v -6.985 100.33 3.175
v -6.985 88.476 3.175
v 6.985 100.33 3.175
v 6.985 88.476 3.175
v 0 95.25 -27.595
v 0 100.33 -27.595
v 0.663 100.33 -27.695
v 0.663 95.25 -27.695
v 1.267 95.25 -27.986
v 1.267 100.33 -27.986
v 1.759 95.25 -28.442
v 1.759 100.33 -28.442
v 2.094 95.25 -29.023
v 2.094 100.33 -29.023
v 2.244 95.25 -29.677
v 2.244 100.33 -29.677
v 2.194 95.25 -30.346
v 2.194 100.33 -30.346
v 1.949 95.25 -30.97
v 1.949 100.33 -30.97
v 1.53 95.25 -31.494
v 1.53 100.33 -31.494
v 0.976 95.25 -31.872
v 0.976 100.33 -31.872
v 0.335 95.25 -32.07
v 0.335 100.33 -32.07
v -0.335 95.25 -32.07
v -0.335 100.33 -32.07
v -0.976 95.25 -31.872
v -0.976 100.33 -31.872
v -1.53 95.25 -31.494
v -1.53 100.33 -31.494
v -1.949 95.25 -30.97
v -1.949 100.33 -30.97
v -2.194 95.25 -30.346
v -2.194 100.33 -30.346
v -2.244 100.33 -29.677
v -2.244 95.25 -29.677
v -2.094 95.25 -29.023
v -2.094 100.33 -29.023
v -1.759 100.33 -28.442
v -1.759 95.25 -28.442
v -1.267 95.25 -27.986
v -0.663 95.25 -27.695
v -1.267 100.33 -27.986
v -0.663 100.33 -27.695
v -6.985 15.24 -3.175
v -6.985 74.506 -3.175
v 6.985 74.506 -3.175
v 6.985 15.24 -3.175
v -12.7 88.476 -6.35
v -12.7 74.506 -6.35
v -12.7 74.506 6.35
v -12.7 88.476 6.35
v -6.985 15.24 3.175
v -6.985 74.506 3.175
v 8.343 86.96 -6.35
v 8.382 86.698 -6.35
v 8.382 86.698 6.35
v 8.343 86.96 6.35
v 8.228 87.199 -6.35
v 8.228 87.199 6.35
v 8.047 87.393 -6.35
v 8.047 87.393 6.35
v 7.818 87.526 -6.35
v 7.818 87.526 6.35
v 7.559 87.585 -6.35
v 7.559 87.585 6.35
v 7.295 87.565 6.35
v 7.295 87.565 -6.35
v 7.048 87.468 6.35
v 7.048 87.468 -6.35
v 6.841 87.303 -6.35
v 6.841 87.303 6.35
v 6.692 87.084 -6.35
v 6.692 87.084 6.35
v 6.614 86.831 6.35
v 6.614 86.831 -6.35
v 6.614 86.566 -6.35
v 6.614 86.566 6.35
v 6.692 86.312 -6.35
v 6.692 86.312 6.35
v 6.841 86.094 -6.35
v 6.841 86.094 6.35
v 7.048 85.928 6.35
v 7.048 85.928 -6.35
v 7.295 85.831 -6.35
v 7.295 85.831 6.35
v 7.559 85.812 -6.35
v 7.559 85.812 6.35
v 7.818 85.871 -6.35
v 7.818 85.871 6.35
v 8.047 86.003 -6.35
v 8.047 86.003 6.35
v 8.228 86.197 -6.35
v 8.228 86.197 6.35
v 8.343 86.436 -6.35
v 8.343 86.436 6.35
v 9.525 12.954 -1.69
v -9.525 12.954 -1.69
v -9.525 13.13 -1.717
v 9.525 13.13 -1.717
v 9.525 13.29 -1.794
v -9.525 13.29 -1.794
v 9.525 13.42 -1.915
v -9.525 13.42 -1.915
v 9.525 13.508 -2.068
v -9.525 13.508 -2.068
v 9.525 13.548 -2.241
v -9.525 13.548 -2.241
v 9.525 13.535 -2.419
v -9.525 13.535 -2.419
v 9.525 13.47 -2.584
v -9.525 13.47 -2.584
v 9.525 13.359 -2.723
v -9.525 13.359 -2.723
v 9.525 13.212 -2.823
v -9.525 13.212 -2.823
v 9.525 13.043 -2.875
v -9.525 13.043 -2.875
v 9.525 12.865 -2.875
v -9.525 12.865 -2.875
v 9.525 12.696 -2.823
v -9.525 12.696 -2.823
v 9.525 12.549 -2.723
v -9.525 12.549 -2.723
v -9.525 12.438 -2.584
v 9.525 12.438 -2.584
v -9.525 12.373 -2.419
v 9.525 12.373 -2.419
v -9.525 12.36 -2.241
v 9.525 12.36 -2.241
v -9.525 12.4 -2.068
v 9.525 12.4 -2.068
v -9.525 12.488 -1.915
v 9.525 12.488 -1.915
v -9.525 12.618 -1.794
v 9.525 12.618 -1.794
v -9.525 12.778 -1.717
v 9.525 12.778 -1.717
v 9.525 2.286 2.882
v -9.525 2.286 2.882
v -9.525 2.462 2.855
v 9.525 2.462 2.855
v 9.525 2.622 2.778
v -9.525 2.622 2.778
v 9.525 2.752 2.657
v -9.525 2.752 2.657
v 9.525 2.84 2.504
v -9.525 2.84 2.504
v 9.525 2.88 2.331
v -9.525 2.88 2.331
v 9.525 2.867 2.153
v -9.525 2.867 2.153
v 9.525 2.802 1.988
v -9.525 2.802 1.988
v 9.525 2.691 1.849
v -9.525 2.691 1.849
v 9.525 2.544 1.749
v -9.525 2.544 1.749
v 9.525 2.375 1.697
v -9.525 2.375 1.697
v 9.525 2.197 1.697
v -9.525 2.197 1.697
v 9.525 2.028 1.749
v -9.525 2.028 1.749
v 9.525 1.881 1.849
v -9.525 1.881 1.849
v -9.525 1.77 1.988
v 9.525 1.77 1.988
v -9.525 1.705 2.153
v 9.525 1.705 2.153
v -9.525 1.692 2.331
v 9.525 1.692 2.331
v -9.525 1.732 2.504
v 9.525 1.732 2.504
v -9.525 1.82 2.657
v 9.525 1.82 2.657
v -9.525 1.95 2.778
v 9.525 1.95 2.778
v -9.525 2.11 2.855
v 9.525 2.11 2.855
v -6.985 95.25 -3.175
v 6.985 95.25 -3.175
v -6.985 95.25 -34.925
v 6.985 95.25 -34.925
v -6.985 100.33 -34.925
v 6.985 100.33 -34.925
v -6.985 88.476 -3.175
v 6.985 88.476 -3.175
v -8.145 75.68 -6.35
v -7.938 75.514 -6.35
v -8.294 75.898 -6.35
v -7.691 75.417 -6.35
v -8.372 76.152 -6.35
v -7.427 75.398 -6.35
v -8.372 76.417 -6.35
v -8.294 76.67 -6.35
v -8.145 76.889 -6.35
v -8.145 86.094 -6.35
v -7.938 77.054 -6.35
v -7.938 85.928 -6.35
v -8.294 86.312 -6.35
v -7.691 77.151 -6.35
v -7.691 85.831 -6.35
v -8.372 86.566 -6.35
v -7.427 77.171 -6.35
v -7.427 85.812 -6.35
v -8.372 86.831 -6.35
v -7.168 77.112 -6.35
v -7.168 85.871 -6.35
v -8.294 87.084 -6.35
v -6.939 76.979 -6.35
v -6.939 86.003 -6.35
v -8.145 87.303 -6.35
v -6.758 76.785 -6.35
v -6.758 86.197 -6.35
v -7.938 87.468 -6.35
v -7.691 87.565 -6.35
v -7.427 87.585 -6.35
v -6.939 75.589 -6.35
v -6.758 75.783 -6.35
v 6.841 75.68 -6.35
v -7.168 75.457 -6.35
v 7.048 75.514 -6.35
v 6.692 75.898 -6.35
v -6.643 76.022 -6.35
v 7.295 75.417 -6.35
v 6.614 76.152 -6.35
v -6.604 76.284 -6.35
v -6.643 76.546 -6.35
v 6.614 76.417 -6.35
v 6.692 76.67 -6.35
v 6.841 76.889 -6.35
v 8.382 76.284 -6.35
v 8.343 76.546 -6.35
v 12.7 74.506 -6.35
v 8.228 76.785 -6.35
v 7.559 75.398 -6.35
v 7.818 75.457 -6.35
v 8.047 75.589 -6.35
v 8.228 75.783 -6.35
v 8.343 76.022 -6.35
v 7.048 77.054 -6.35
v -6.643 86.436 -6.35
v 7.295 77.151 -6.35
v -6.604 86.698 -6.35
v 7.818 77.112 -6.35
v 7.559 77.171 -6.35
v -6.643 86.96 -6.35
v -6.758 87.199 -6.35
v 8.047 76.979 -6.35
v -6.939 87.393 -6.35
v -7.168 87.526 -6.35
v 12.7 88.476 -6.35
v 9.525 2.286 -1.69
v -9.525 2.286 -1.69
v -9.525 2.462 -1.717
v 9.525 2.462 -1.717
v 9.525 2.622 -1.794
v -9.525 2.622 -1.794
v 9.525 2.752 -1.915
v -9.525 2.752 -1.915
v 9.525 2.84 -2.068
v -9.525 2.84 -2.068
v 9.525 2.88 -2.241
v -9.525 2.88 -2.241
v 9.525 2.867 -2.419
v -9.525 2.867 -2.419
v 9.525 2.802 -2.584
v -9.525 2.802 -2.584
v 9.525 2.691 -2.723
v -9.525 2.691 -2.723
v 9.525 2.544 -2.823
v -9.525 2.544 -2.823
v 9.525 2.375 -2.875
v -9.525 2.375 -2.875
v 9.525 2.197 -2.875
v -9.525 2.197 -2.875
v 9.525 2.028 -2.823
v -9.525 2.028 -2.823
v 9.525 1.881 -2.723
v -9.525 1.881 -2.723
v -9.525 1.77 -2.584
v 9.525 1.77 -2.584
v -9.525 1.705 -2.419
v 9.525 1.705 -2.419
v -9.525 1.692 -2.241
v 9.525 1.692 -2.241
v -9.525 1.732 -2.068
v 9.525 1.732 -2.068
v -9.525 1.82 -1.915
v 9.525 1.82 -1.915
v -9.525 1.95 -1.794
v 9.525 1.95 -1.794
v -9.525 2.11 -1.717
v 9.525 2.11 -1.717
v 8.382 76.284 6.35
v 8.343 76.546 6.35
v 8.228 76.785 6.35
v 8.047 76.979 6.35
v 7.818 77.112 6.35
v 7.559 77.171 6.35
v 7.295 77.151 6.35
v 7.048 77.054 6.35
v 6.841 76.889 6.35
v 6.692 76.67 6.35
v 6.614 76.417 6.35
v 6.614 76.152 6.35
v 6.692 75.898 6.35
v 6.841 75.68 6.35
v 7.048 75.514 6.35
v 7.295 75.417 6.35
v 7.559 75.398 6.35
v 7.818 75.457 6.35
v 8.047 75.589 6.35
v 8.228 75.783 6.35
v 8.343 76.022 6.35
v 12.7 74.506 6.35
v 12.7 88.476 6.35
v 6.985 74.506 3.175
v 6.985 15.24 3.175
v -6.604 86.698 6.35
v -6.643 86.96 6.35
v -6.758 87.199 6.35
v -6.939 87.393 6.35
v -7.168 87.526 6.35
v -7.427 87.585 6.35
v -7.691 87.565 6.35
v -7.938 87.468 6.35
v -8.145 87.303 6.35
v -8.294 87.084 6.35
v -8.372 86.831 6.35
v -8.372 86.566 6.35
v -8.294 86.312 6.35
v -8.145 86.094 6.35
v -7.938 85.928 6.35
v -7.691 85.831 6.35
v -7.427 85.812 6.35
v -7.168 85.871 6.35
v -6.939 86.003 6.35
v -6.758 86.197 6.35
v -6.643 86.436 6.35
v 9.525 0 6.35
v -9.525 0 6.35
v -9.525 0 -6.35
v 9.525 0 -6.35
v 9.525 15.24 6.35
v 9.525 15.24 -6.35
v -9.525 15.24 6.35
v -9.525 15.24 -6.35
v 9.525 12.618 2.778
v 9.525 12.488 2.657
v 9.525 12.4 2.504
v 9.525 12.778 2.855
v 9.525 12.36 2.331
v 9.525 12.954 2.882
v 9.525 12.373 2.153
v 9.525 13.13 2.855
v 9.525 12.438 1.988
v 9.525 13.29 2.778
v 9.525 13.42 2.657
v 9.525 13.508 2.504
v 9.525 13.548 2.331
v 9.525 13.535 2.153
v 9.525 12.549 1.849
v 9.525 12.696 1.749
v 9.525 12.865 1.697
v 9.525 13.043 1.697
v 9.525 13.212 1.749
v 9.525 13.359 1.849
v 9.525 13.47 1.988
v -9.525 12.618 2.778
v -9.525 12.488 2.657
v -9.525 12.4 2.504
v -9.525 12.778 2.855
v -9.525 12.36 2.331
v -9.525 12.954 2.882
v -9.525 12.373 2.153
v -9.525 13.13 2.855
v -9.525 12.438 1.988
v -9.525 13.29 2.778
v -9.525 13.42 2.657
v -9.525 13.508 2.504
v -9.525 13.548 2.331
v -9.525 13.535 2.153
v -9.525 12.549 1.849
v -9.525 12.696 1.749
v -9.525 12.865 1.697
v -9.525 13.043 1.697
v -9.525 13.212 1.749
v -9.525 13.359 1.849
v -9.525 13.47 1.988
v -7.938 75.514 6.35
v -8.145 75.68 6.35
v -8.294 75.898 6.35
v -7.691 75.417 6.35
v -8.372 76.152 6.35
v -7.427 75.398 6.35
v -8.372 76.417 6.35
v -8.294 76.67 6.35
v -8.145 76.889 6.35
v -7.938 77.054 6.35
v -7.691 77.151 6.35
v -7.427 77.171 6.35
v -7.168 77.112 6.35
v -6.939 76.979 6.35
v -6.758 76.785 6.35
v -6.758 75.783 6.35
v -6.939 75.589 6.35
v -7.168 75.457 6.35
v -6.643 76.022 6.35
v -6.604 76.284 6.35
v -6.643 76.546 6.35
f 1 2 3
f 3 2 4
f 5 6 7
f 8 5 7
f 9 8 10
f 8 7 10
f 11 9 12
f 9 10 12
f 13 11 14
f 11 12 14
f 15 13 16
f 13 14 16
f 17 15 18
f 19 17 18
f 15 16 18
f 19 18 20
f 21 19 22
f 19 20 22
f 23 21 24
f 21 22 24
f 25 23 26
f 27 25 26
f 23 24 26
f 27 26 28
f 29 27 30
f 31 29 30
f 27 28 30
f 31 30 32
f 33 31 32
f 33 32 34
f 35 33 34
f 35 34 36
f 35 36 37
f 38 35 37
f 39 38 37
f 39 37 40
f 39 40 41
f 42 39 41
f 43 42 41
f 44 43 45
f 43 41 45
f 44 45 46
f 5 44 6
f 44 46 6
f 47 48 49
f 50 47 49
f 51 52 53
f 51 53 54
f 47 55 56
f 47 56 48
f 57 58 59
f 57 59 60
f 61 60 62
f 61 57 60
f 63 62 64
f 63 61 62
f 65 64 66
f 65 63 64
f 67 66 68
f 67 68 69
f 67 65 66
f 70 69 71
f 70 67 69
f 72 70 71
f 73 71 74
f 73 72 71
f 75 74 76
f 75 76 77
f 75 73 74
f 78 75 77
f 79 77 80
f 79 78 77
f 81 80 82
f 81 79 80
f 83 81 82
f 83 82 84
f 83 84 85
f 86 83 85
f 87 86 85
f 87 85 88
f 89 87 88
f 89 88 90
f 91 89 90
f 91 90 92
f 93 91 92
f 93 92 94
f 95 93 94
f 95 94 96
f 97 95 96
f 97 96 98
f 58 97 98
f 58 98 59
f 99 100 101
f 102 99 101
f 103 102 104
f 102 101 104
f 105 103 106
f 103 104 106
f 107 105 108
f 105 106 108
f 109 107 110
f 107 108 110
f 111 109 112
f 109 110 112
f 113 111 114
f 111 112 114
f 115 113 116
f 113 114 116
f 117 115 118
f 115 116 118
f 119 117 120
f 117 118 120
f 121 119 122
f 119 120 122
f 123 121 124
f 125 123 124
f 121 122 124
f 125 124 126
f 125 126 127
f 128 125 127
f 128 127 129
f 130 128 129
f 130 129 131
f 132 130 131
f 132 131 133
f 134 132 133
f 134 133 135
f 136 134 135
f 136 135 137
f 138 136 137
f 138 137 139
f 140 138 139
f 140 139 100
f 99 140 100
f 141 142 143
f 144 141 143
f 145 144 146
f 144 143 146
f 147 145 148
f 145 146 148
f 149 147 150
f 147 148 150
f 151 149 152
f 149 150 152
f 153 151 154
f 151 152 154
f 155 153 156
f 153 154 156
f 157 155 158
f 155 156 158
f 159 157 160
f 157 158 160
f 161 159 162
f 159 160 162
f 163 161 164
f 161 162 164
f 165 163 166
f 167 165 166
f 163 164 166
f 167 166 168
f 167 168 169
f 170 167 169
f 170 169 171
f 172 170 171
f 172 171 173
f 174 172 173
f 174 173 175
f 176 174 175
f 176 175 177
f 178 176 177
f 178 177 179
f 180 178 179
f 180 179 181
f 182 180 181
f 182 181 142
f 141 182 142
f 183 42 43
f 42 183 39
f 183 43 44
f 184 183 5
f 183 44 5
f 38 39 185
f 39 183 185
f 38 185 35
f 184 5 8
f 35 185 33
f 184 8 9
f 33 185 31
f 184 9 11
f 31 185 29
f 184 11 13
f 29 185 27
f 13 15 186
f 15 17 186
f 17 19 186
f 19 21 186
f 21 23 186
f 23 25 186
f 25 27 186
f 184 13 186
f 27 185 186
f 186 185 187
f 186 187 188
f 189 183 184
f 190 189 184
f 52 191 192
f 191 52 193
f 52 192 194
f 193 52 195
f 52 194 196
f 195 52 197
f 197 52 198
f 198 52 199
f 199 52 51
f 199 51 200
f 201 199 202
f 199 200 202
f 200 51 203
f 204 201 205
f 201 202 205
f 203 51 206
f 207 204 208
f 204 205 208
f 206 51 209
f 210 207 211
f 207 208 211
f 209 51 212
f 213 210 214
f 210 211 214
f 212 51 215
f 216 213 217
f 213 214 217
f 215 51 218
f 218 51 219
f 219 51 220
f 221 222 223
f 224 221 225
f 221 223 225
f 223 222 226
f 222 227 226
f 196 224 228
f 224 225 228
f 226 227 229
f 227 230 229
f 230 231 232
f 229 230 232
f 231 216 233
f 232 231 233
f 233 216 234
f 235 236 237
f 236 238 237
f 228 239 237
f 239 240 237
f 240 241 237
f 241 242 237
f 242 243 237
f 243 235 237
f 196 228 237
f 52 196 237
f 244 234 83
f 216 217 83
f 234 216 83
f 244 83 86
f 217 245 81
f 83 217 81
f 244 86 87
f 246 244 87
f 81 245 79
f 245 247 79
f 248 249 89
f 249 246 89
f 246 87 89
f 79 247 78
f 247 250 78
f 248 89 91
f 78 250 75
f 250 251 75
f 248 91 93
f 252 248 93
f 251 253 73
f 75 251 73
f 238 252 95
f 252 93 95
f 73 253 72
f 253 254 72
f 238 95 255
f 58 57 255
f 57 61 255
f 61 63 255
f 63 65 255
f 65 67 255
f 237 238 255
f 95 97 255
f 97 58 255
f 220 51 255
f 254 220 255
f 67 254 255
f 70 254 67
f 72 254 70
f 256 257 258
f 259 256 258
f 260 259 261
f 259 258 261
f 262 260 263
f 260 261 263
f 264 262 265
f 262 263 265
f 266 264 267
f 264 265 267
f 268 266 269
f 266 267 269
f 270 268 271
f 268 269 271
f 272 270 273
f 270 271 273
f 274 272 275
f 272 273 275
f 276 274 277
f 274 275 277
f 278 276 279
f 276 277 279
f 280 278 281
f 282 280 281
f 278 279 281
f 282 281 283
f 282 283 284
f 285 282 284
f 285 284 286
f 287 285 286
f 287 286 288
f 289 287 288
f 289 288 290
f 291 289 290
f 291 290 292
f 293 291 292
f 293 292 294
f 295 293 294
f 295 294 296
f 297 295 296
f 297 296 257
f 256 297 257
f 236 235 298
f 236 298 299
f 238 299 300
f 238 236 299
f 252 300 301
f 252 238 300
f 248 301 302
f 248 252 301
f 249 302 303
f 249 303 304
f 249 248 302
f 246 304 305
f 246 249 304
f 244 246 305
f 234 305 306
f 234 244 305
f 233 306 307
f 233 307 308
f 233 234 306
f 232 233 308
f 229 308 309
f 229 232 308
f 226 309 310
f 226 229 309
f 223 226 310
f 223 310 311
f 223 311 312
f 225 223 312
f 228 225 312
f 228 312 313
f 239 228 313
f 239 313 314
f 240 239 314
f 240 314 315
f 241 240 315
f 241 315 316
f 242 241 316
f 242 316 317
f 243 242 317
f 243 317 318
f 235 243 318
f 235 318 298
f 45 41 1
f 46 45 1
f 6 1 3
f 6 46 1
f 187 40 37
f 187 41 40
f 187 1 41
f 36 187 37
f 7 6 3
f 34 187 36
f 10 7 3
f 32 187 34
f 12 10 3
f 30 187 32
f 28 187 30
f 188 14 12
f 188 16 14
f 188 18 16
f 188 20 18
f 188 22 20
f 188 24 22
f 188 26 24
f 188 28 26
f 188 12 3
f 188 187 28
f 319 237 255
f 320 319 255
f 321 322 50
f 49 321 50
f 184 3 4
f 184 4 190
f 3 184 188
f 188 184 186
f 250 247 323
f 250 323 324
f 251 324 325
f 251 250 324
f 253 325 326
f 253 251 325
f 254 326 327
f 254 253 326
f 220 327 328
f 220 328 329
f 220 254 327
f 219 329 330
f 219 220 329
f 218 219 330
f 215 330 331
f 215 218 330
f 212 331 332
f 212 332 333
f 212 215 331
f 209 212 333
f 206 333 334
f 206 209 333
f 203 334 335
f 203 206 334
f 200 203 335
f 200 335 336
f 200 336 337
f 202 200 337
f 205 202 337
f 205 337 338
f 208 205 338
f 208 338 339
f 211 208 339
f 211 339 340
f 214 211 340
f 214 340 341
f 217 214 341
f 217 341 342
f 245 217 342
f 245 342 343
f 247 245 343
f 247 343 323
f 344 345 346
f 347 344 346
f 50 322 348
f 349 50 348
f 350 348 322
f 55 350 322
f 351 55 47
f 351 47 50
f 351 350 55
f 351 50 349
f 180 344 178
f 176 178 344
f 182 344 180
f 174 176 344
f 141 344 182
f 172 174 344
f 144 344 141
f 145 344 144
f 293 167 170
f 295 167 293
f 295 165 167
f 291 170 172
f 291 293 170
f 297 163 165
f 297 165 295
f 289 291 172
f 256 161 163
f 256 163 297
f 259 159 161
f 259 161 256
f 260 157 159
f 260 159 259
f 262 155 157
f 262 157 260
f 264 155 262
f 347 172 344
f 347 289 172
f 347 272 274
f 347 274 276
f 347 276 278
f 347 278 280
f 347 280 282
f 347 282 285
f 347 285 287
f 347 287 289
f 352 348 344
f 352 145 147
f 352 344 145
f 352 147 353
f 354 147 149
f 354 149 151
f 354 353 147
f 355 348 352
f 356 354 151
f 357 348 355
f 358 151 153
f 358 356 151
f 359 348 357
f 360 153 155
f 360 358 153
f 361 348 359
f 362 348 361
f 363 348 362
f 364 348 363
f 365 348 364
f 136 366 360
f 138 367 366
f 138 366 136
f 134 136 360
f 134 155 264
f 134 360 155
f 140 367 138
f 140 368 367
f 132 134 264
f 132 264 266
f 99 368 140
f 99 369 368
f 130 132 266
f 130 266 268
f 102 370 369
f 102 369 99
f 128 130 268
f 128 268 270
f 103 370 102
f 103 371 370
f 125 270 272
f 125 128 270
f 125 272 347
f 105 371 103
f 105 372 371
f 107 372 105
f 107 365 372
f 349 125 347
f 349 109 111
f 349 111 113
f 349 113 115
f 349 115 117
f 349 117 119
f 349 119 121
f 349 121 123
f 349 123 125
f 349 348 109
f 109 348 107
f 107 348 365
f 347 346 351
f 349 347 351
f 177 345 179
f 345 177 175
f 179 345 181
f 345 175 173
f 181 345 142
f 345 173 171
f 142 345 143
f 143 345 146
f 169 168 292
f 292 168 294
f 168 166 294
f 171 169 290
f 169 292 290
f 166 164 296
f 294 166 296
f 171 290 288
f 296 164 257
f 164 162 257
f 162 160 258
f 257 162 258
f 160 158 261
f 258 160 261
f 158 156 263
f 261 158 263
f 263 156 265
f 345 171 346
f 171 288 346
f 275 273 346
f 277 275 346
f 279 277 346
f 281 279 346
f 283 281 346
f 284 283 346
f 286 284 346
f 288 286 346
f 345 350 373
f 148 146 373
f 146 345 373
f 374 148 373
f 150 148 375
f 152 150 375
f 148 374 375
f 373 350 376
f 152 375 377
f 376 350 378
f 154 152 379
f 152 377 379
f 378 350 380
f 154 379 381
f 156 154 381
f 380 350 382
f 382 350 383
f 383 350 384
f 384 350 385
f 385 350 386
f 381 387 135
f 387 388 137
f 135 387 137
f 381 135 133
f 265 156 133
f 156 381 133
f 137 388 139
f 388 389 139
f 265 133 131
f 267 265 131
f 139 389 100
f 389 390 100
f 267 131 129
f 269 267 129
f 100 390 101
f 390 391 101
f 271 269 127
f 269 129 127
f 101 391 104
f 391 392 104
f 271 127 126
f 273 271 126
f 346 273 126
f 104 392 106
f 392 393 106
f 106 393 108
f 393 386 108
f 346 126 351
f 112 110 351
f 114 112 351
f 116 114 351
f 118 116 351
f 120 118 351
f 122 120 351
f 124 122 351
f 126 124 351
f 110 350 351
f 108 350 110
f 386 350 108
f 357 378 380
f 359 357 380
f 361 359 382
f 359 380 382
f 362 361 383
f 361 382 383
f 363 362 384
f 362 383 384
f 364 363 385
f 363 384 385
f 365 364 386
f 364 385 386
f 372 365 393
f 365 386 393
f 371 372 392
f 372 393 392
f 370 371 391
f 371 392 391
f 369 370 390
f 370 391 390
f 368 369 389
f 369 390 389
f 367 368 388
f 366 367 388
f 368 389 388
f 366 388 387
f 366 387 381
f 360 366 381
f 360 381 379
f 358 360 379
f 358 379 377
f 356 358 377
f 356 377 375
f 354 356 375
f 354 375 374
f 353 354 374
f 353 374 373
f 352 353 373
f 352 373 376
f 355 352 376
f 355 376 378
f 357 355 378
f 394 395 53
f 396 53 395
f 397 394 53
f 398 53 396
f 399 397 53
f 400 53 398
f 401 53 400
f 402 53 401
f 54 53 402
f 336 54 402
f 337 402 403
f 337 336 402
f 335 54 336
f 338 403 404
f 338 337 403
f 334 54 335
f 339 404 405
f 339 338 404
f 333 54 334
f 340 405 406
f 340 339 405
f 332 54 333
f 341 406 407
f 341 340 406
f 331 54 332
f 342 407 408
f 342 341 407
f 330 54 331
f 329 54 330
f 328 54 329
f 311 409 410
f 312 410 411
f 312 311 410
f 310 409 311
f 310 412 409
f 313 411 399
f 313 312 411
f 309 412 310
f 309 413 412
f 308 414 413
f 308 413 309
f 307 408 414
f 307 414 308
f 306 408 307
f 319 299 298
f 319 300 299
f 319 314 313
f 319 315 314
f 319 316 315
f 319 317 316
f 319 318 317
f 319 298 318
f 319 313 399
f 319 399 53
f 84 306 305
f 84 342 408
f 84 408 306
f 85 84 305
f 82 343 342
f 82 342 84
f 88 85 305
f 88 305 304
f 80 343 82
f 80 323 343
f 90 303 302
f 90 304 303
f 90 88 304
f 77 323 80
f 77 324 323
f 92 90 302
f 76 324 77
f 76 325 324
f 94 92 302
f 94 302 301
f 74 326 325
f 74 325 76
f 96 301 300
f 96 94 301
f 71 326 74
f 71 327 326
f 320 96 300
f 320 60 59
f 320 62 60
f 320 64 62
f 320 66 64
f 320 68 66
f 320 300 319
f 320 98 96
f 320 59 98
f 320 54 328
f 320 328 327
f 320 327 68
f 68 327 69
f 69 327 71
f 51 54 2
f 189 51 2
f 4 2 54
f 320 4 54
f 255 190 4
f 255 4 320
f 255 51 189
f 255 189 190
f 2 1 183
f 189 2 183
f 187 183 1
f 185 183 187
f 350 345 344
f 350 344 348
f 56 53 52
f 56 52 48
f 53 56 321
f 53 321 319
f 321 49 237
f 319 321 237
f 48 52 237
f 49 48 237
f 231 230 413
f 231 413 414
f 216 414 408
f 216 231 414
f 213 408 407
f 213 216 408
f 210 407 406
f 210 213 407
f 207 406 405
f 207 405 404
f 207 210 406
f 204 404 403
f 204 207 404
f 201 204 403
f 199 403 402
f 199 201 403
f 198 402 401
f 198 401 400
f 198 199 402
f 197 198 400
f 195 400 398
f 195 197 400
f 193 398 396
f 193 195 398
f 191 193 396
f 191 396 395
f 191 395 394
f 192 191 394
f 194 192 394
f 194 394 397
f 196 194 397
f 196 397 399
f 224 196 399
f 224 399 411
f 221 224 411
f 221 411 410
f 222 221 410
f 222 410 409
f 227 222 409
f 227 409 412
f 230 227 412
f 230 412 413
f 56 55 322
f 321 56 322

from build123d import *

# Parameters (mm, degrees)
SKETCH1_W                = 13.97
SKETCH1_H                = 6.35
BOSS_EXTRUDE1_DEPTH      = 95.25
SKETCH3_W                = 25.4
SKETCH3_H                = 13.97
BOSS_EXTRUDE3_DEPTH      = 6.35
BOSS_EXTRUDE5_DEPTH      = 9.525
BOSS_EXTRUDE5_DEPTH_BACK = 9.525
SKETCH5_W                = 12.7
SKETCH5_H                = 15.24
SKETCH6_W                = 13.97
SKETCH6_H                = 38.1
BOSS_EXTRUDE6_DEPTH      = 5.08
SKETCH7_R                = 2.25
CUT_EXTRUDE1_DEPTH       = 5.08
SKETCH8_R                = 0.59563
CUT_EXTRUDE2_DEPTH       = 109.534856843
SKETCH9_R                = 0.889
CUT_EXTRUDE3_DEPTH       = 109.069463309
BOSS_EXTRUDE7_DEPTH      = 6.35
BOSS_EXTRUDE7_DEPTH_BACK = 6.35
SKETCH10_W               = 25.4
SKETCH10_H               = 13.97
SKETCH10_R               = 0.889


with BuildPart() as part:
    # Sketch1 → Boss-Extrude1 (new body)
    with BuildSketch(Plane(origin=(0, 0, 0), x_dir=(1, 0, 0), z_dir=(0, 1, 0))):
        Rectangle(SKETCH1_W, SKETCH1_H)
    extrude(amount=BOSS_EXTRUDE1_DEPTH)

    # Sketch3 → Boss-Extrude3 (add)
    with BuildSketch(Plane.XY.offset(3.175)):
        with Locations((0, 81.491176781)):
            Rectangle(SKETCH3_W, SKETCH3_H)
    extrude(amount=-BOSS_EXTRUDE3_DEPTH)

    # Sketch5 → Boss-Extrude5 (add, two sides: drawn at the far end of the back side and taken through both)
    with BuildSketch(Plane(origin=(0, 0, 0), x_dir=(0, 0, -1), z_dir=(1, 0, 0)).offset(-BOSS_EXTRUDE5_DEPTH_BACK)):
        with Locations((0, 7.62)):
            Rectangle(SKETCH5_W, SKETCH5_H)
    extrude(amount=BOSS_EXTRUDE5_DEPTH + BOSS_EXTRUDE5_DEPTH_BACK)

    # Sketch6 → Boss-Extrude6 (add)
    with BuildSketch(Plane(origin=(0, 95.25, 0), x_dir=(1, 0, 0), z_dir=(0, 1, 0))):
        with Locations((0, 15.875)):
            Rectangle(SKETCH6_W, SKETCH6_H)
    extrude(amount=BOSS_EXTRUDE6_DEPTH)

    # Sketch7 → Cut-Extrude1 (cut)
    with BuildSketch(Plane(origin=(0, 100.33, 0), x_dir=(1, 0, 0), z_dir=(0, 1, 0))):
        with Locations(Location((0, 29.845, 0), (0, 0, 270))):
            Circle(SKETCH7_R)
    extrude(amount=-CUT_EXTRUDE1_DEPTH, mode=Mode.SUBTRACT)

    # Sketch8 → Cut-Extrude2 (cut, through all)
    with BuildSketch(Plane.ZY.offset(9.525)):
        with Locations((-2.286, 12.954)):
            Circle(SKETCH8_R)
        with Locations((2.286, 12.954)):
            Circle(SKETCH8_R)
        with Locations((2.286, 2.286)):
            Circle(SKETCH8_R)
        with Locations((-2.286, 2.286)):
            Circle(SKETCH8_R)
    extrude(amount=-CUT_EXTRUDE2_DEPTH, mode=Mode.SUBTRACT)

    # Sketch9 → Cut-Extrude3 (cut, through all)
    with BuildSketch(Plane.XY.offset(3.175)):
        with Locations((-7.493, 86.698176781)):
            Circle(SKETCH9_R)
        with Locations((7.493, 86.698176781)):
            Circle(SKETCH9_R)
        with Locations((7.493, 76.284176781)):
            Circle(SKETCH9_R)
        with Locations((-7.493, 76.284176781)):
            Circle(SKETCH9_R)
    extrude(amount=-CUT_EXTRUDE3_DEPTH, mode=Mode.SUBTRACT)

    # Sketch10 → Boss-Extrude7 (add, two sides: drawn at the far end of the back side and taken through both)
    with BuildSketch(Plane.XY.offset(-BOSS_EXTRUDE7_DEPTH_BACK)):
        with Locations((0, 81.491176781)):
            Rectangle(SKETCH10_W, SKETCH10_H)
        with Locations((-7.493, 86.698176781)):
            Circle(SKETCH10_R, mode=Mode.SUBTRACT)
        with Locations((-7.493, 76.284176781)):
            Circle(SKETCH10_R, mode=Mode.SUBTRACT)
        with Locations((7.493, 76.284176781)):
            Circle(SKETCH10_R, mode=Mode.SUBTRACT)
        with Locations((7.493, 86.698176781)):
            Circle(SKETCH10_R, mode=Mode.SUBTRACT)
    extrude(amount=BOSS_EXTRUDE7_DEPTH + BOSS_EXTRUDE7_DEPTH_BACK)


solid = part.part
